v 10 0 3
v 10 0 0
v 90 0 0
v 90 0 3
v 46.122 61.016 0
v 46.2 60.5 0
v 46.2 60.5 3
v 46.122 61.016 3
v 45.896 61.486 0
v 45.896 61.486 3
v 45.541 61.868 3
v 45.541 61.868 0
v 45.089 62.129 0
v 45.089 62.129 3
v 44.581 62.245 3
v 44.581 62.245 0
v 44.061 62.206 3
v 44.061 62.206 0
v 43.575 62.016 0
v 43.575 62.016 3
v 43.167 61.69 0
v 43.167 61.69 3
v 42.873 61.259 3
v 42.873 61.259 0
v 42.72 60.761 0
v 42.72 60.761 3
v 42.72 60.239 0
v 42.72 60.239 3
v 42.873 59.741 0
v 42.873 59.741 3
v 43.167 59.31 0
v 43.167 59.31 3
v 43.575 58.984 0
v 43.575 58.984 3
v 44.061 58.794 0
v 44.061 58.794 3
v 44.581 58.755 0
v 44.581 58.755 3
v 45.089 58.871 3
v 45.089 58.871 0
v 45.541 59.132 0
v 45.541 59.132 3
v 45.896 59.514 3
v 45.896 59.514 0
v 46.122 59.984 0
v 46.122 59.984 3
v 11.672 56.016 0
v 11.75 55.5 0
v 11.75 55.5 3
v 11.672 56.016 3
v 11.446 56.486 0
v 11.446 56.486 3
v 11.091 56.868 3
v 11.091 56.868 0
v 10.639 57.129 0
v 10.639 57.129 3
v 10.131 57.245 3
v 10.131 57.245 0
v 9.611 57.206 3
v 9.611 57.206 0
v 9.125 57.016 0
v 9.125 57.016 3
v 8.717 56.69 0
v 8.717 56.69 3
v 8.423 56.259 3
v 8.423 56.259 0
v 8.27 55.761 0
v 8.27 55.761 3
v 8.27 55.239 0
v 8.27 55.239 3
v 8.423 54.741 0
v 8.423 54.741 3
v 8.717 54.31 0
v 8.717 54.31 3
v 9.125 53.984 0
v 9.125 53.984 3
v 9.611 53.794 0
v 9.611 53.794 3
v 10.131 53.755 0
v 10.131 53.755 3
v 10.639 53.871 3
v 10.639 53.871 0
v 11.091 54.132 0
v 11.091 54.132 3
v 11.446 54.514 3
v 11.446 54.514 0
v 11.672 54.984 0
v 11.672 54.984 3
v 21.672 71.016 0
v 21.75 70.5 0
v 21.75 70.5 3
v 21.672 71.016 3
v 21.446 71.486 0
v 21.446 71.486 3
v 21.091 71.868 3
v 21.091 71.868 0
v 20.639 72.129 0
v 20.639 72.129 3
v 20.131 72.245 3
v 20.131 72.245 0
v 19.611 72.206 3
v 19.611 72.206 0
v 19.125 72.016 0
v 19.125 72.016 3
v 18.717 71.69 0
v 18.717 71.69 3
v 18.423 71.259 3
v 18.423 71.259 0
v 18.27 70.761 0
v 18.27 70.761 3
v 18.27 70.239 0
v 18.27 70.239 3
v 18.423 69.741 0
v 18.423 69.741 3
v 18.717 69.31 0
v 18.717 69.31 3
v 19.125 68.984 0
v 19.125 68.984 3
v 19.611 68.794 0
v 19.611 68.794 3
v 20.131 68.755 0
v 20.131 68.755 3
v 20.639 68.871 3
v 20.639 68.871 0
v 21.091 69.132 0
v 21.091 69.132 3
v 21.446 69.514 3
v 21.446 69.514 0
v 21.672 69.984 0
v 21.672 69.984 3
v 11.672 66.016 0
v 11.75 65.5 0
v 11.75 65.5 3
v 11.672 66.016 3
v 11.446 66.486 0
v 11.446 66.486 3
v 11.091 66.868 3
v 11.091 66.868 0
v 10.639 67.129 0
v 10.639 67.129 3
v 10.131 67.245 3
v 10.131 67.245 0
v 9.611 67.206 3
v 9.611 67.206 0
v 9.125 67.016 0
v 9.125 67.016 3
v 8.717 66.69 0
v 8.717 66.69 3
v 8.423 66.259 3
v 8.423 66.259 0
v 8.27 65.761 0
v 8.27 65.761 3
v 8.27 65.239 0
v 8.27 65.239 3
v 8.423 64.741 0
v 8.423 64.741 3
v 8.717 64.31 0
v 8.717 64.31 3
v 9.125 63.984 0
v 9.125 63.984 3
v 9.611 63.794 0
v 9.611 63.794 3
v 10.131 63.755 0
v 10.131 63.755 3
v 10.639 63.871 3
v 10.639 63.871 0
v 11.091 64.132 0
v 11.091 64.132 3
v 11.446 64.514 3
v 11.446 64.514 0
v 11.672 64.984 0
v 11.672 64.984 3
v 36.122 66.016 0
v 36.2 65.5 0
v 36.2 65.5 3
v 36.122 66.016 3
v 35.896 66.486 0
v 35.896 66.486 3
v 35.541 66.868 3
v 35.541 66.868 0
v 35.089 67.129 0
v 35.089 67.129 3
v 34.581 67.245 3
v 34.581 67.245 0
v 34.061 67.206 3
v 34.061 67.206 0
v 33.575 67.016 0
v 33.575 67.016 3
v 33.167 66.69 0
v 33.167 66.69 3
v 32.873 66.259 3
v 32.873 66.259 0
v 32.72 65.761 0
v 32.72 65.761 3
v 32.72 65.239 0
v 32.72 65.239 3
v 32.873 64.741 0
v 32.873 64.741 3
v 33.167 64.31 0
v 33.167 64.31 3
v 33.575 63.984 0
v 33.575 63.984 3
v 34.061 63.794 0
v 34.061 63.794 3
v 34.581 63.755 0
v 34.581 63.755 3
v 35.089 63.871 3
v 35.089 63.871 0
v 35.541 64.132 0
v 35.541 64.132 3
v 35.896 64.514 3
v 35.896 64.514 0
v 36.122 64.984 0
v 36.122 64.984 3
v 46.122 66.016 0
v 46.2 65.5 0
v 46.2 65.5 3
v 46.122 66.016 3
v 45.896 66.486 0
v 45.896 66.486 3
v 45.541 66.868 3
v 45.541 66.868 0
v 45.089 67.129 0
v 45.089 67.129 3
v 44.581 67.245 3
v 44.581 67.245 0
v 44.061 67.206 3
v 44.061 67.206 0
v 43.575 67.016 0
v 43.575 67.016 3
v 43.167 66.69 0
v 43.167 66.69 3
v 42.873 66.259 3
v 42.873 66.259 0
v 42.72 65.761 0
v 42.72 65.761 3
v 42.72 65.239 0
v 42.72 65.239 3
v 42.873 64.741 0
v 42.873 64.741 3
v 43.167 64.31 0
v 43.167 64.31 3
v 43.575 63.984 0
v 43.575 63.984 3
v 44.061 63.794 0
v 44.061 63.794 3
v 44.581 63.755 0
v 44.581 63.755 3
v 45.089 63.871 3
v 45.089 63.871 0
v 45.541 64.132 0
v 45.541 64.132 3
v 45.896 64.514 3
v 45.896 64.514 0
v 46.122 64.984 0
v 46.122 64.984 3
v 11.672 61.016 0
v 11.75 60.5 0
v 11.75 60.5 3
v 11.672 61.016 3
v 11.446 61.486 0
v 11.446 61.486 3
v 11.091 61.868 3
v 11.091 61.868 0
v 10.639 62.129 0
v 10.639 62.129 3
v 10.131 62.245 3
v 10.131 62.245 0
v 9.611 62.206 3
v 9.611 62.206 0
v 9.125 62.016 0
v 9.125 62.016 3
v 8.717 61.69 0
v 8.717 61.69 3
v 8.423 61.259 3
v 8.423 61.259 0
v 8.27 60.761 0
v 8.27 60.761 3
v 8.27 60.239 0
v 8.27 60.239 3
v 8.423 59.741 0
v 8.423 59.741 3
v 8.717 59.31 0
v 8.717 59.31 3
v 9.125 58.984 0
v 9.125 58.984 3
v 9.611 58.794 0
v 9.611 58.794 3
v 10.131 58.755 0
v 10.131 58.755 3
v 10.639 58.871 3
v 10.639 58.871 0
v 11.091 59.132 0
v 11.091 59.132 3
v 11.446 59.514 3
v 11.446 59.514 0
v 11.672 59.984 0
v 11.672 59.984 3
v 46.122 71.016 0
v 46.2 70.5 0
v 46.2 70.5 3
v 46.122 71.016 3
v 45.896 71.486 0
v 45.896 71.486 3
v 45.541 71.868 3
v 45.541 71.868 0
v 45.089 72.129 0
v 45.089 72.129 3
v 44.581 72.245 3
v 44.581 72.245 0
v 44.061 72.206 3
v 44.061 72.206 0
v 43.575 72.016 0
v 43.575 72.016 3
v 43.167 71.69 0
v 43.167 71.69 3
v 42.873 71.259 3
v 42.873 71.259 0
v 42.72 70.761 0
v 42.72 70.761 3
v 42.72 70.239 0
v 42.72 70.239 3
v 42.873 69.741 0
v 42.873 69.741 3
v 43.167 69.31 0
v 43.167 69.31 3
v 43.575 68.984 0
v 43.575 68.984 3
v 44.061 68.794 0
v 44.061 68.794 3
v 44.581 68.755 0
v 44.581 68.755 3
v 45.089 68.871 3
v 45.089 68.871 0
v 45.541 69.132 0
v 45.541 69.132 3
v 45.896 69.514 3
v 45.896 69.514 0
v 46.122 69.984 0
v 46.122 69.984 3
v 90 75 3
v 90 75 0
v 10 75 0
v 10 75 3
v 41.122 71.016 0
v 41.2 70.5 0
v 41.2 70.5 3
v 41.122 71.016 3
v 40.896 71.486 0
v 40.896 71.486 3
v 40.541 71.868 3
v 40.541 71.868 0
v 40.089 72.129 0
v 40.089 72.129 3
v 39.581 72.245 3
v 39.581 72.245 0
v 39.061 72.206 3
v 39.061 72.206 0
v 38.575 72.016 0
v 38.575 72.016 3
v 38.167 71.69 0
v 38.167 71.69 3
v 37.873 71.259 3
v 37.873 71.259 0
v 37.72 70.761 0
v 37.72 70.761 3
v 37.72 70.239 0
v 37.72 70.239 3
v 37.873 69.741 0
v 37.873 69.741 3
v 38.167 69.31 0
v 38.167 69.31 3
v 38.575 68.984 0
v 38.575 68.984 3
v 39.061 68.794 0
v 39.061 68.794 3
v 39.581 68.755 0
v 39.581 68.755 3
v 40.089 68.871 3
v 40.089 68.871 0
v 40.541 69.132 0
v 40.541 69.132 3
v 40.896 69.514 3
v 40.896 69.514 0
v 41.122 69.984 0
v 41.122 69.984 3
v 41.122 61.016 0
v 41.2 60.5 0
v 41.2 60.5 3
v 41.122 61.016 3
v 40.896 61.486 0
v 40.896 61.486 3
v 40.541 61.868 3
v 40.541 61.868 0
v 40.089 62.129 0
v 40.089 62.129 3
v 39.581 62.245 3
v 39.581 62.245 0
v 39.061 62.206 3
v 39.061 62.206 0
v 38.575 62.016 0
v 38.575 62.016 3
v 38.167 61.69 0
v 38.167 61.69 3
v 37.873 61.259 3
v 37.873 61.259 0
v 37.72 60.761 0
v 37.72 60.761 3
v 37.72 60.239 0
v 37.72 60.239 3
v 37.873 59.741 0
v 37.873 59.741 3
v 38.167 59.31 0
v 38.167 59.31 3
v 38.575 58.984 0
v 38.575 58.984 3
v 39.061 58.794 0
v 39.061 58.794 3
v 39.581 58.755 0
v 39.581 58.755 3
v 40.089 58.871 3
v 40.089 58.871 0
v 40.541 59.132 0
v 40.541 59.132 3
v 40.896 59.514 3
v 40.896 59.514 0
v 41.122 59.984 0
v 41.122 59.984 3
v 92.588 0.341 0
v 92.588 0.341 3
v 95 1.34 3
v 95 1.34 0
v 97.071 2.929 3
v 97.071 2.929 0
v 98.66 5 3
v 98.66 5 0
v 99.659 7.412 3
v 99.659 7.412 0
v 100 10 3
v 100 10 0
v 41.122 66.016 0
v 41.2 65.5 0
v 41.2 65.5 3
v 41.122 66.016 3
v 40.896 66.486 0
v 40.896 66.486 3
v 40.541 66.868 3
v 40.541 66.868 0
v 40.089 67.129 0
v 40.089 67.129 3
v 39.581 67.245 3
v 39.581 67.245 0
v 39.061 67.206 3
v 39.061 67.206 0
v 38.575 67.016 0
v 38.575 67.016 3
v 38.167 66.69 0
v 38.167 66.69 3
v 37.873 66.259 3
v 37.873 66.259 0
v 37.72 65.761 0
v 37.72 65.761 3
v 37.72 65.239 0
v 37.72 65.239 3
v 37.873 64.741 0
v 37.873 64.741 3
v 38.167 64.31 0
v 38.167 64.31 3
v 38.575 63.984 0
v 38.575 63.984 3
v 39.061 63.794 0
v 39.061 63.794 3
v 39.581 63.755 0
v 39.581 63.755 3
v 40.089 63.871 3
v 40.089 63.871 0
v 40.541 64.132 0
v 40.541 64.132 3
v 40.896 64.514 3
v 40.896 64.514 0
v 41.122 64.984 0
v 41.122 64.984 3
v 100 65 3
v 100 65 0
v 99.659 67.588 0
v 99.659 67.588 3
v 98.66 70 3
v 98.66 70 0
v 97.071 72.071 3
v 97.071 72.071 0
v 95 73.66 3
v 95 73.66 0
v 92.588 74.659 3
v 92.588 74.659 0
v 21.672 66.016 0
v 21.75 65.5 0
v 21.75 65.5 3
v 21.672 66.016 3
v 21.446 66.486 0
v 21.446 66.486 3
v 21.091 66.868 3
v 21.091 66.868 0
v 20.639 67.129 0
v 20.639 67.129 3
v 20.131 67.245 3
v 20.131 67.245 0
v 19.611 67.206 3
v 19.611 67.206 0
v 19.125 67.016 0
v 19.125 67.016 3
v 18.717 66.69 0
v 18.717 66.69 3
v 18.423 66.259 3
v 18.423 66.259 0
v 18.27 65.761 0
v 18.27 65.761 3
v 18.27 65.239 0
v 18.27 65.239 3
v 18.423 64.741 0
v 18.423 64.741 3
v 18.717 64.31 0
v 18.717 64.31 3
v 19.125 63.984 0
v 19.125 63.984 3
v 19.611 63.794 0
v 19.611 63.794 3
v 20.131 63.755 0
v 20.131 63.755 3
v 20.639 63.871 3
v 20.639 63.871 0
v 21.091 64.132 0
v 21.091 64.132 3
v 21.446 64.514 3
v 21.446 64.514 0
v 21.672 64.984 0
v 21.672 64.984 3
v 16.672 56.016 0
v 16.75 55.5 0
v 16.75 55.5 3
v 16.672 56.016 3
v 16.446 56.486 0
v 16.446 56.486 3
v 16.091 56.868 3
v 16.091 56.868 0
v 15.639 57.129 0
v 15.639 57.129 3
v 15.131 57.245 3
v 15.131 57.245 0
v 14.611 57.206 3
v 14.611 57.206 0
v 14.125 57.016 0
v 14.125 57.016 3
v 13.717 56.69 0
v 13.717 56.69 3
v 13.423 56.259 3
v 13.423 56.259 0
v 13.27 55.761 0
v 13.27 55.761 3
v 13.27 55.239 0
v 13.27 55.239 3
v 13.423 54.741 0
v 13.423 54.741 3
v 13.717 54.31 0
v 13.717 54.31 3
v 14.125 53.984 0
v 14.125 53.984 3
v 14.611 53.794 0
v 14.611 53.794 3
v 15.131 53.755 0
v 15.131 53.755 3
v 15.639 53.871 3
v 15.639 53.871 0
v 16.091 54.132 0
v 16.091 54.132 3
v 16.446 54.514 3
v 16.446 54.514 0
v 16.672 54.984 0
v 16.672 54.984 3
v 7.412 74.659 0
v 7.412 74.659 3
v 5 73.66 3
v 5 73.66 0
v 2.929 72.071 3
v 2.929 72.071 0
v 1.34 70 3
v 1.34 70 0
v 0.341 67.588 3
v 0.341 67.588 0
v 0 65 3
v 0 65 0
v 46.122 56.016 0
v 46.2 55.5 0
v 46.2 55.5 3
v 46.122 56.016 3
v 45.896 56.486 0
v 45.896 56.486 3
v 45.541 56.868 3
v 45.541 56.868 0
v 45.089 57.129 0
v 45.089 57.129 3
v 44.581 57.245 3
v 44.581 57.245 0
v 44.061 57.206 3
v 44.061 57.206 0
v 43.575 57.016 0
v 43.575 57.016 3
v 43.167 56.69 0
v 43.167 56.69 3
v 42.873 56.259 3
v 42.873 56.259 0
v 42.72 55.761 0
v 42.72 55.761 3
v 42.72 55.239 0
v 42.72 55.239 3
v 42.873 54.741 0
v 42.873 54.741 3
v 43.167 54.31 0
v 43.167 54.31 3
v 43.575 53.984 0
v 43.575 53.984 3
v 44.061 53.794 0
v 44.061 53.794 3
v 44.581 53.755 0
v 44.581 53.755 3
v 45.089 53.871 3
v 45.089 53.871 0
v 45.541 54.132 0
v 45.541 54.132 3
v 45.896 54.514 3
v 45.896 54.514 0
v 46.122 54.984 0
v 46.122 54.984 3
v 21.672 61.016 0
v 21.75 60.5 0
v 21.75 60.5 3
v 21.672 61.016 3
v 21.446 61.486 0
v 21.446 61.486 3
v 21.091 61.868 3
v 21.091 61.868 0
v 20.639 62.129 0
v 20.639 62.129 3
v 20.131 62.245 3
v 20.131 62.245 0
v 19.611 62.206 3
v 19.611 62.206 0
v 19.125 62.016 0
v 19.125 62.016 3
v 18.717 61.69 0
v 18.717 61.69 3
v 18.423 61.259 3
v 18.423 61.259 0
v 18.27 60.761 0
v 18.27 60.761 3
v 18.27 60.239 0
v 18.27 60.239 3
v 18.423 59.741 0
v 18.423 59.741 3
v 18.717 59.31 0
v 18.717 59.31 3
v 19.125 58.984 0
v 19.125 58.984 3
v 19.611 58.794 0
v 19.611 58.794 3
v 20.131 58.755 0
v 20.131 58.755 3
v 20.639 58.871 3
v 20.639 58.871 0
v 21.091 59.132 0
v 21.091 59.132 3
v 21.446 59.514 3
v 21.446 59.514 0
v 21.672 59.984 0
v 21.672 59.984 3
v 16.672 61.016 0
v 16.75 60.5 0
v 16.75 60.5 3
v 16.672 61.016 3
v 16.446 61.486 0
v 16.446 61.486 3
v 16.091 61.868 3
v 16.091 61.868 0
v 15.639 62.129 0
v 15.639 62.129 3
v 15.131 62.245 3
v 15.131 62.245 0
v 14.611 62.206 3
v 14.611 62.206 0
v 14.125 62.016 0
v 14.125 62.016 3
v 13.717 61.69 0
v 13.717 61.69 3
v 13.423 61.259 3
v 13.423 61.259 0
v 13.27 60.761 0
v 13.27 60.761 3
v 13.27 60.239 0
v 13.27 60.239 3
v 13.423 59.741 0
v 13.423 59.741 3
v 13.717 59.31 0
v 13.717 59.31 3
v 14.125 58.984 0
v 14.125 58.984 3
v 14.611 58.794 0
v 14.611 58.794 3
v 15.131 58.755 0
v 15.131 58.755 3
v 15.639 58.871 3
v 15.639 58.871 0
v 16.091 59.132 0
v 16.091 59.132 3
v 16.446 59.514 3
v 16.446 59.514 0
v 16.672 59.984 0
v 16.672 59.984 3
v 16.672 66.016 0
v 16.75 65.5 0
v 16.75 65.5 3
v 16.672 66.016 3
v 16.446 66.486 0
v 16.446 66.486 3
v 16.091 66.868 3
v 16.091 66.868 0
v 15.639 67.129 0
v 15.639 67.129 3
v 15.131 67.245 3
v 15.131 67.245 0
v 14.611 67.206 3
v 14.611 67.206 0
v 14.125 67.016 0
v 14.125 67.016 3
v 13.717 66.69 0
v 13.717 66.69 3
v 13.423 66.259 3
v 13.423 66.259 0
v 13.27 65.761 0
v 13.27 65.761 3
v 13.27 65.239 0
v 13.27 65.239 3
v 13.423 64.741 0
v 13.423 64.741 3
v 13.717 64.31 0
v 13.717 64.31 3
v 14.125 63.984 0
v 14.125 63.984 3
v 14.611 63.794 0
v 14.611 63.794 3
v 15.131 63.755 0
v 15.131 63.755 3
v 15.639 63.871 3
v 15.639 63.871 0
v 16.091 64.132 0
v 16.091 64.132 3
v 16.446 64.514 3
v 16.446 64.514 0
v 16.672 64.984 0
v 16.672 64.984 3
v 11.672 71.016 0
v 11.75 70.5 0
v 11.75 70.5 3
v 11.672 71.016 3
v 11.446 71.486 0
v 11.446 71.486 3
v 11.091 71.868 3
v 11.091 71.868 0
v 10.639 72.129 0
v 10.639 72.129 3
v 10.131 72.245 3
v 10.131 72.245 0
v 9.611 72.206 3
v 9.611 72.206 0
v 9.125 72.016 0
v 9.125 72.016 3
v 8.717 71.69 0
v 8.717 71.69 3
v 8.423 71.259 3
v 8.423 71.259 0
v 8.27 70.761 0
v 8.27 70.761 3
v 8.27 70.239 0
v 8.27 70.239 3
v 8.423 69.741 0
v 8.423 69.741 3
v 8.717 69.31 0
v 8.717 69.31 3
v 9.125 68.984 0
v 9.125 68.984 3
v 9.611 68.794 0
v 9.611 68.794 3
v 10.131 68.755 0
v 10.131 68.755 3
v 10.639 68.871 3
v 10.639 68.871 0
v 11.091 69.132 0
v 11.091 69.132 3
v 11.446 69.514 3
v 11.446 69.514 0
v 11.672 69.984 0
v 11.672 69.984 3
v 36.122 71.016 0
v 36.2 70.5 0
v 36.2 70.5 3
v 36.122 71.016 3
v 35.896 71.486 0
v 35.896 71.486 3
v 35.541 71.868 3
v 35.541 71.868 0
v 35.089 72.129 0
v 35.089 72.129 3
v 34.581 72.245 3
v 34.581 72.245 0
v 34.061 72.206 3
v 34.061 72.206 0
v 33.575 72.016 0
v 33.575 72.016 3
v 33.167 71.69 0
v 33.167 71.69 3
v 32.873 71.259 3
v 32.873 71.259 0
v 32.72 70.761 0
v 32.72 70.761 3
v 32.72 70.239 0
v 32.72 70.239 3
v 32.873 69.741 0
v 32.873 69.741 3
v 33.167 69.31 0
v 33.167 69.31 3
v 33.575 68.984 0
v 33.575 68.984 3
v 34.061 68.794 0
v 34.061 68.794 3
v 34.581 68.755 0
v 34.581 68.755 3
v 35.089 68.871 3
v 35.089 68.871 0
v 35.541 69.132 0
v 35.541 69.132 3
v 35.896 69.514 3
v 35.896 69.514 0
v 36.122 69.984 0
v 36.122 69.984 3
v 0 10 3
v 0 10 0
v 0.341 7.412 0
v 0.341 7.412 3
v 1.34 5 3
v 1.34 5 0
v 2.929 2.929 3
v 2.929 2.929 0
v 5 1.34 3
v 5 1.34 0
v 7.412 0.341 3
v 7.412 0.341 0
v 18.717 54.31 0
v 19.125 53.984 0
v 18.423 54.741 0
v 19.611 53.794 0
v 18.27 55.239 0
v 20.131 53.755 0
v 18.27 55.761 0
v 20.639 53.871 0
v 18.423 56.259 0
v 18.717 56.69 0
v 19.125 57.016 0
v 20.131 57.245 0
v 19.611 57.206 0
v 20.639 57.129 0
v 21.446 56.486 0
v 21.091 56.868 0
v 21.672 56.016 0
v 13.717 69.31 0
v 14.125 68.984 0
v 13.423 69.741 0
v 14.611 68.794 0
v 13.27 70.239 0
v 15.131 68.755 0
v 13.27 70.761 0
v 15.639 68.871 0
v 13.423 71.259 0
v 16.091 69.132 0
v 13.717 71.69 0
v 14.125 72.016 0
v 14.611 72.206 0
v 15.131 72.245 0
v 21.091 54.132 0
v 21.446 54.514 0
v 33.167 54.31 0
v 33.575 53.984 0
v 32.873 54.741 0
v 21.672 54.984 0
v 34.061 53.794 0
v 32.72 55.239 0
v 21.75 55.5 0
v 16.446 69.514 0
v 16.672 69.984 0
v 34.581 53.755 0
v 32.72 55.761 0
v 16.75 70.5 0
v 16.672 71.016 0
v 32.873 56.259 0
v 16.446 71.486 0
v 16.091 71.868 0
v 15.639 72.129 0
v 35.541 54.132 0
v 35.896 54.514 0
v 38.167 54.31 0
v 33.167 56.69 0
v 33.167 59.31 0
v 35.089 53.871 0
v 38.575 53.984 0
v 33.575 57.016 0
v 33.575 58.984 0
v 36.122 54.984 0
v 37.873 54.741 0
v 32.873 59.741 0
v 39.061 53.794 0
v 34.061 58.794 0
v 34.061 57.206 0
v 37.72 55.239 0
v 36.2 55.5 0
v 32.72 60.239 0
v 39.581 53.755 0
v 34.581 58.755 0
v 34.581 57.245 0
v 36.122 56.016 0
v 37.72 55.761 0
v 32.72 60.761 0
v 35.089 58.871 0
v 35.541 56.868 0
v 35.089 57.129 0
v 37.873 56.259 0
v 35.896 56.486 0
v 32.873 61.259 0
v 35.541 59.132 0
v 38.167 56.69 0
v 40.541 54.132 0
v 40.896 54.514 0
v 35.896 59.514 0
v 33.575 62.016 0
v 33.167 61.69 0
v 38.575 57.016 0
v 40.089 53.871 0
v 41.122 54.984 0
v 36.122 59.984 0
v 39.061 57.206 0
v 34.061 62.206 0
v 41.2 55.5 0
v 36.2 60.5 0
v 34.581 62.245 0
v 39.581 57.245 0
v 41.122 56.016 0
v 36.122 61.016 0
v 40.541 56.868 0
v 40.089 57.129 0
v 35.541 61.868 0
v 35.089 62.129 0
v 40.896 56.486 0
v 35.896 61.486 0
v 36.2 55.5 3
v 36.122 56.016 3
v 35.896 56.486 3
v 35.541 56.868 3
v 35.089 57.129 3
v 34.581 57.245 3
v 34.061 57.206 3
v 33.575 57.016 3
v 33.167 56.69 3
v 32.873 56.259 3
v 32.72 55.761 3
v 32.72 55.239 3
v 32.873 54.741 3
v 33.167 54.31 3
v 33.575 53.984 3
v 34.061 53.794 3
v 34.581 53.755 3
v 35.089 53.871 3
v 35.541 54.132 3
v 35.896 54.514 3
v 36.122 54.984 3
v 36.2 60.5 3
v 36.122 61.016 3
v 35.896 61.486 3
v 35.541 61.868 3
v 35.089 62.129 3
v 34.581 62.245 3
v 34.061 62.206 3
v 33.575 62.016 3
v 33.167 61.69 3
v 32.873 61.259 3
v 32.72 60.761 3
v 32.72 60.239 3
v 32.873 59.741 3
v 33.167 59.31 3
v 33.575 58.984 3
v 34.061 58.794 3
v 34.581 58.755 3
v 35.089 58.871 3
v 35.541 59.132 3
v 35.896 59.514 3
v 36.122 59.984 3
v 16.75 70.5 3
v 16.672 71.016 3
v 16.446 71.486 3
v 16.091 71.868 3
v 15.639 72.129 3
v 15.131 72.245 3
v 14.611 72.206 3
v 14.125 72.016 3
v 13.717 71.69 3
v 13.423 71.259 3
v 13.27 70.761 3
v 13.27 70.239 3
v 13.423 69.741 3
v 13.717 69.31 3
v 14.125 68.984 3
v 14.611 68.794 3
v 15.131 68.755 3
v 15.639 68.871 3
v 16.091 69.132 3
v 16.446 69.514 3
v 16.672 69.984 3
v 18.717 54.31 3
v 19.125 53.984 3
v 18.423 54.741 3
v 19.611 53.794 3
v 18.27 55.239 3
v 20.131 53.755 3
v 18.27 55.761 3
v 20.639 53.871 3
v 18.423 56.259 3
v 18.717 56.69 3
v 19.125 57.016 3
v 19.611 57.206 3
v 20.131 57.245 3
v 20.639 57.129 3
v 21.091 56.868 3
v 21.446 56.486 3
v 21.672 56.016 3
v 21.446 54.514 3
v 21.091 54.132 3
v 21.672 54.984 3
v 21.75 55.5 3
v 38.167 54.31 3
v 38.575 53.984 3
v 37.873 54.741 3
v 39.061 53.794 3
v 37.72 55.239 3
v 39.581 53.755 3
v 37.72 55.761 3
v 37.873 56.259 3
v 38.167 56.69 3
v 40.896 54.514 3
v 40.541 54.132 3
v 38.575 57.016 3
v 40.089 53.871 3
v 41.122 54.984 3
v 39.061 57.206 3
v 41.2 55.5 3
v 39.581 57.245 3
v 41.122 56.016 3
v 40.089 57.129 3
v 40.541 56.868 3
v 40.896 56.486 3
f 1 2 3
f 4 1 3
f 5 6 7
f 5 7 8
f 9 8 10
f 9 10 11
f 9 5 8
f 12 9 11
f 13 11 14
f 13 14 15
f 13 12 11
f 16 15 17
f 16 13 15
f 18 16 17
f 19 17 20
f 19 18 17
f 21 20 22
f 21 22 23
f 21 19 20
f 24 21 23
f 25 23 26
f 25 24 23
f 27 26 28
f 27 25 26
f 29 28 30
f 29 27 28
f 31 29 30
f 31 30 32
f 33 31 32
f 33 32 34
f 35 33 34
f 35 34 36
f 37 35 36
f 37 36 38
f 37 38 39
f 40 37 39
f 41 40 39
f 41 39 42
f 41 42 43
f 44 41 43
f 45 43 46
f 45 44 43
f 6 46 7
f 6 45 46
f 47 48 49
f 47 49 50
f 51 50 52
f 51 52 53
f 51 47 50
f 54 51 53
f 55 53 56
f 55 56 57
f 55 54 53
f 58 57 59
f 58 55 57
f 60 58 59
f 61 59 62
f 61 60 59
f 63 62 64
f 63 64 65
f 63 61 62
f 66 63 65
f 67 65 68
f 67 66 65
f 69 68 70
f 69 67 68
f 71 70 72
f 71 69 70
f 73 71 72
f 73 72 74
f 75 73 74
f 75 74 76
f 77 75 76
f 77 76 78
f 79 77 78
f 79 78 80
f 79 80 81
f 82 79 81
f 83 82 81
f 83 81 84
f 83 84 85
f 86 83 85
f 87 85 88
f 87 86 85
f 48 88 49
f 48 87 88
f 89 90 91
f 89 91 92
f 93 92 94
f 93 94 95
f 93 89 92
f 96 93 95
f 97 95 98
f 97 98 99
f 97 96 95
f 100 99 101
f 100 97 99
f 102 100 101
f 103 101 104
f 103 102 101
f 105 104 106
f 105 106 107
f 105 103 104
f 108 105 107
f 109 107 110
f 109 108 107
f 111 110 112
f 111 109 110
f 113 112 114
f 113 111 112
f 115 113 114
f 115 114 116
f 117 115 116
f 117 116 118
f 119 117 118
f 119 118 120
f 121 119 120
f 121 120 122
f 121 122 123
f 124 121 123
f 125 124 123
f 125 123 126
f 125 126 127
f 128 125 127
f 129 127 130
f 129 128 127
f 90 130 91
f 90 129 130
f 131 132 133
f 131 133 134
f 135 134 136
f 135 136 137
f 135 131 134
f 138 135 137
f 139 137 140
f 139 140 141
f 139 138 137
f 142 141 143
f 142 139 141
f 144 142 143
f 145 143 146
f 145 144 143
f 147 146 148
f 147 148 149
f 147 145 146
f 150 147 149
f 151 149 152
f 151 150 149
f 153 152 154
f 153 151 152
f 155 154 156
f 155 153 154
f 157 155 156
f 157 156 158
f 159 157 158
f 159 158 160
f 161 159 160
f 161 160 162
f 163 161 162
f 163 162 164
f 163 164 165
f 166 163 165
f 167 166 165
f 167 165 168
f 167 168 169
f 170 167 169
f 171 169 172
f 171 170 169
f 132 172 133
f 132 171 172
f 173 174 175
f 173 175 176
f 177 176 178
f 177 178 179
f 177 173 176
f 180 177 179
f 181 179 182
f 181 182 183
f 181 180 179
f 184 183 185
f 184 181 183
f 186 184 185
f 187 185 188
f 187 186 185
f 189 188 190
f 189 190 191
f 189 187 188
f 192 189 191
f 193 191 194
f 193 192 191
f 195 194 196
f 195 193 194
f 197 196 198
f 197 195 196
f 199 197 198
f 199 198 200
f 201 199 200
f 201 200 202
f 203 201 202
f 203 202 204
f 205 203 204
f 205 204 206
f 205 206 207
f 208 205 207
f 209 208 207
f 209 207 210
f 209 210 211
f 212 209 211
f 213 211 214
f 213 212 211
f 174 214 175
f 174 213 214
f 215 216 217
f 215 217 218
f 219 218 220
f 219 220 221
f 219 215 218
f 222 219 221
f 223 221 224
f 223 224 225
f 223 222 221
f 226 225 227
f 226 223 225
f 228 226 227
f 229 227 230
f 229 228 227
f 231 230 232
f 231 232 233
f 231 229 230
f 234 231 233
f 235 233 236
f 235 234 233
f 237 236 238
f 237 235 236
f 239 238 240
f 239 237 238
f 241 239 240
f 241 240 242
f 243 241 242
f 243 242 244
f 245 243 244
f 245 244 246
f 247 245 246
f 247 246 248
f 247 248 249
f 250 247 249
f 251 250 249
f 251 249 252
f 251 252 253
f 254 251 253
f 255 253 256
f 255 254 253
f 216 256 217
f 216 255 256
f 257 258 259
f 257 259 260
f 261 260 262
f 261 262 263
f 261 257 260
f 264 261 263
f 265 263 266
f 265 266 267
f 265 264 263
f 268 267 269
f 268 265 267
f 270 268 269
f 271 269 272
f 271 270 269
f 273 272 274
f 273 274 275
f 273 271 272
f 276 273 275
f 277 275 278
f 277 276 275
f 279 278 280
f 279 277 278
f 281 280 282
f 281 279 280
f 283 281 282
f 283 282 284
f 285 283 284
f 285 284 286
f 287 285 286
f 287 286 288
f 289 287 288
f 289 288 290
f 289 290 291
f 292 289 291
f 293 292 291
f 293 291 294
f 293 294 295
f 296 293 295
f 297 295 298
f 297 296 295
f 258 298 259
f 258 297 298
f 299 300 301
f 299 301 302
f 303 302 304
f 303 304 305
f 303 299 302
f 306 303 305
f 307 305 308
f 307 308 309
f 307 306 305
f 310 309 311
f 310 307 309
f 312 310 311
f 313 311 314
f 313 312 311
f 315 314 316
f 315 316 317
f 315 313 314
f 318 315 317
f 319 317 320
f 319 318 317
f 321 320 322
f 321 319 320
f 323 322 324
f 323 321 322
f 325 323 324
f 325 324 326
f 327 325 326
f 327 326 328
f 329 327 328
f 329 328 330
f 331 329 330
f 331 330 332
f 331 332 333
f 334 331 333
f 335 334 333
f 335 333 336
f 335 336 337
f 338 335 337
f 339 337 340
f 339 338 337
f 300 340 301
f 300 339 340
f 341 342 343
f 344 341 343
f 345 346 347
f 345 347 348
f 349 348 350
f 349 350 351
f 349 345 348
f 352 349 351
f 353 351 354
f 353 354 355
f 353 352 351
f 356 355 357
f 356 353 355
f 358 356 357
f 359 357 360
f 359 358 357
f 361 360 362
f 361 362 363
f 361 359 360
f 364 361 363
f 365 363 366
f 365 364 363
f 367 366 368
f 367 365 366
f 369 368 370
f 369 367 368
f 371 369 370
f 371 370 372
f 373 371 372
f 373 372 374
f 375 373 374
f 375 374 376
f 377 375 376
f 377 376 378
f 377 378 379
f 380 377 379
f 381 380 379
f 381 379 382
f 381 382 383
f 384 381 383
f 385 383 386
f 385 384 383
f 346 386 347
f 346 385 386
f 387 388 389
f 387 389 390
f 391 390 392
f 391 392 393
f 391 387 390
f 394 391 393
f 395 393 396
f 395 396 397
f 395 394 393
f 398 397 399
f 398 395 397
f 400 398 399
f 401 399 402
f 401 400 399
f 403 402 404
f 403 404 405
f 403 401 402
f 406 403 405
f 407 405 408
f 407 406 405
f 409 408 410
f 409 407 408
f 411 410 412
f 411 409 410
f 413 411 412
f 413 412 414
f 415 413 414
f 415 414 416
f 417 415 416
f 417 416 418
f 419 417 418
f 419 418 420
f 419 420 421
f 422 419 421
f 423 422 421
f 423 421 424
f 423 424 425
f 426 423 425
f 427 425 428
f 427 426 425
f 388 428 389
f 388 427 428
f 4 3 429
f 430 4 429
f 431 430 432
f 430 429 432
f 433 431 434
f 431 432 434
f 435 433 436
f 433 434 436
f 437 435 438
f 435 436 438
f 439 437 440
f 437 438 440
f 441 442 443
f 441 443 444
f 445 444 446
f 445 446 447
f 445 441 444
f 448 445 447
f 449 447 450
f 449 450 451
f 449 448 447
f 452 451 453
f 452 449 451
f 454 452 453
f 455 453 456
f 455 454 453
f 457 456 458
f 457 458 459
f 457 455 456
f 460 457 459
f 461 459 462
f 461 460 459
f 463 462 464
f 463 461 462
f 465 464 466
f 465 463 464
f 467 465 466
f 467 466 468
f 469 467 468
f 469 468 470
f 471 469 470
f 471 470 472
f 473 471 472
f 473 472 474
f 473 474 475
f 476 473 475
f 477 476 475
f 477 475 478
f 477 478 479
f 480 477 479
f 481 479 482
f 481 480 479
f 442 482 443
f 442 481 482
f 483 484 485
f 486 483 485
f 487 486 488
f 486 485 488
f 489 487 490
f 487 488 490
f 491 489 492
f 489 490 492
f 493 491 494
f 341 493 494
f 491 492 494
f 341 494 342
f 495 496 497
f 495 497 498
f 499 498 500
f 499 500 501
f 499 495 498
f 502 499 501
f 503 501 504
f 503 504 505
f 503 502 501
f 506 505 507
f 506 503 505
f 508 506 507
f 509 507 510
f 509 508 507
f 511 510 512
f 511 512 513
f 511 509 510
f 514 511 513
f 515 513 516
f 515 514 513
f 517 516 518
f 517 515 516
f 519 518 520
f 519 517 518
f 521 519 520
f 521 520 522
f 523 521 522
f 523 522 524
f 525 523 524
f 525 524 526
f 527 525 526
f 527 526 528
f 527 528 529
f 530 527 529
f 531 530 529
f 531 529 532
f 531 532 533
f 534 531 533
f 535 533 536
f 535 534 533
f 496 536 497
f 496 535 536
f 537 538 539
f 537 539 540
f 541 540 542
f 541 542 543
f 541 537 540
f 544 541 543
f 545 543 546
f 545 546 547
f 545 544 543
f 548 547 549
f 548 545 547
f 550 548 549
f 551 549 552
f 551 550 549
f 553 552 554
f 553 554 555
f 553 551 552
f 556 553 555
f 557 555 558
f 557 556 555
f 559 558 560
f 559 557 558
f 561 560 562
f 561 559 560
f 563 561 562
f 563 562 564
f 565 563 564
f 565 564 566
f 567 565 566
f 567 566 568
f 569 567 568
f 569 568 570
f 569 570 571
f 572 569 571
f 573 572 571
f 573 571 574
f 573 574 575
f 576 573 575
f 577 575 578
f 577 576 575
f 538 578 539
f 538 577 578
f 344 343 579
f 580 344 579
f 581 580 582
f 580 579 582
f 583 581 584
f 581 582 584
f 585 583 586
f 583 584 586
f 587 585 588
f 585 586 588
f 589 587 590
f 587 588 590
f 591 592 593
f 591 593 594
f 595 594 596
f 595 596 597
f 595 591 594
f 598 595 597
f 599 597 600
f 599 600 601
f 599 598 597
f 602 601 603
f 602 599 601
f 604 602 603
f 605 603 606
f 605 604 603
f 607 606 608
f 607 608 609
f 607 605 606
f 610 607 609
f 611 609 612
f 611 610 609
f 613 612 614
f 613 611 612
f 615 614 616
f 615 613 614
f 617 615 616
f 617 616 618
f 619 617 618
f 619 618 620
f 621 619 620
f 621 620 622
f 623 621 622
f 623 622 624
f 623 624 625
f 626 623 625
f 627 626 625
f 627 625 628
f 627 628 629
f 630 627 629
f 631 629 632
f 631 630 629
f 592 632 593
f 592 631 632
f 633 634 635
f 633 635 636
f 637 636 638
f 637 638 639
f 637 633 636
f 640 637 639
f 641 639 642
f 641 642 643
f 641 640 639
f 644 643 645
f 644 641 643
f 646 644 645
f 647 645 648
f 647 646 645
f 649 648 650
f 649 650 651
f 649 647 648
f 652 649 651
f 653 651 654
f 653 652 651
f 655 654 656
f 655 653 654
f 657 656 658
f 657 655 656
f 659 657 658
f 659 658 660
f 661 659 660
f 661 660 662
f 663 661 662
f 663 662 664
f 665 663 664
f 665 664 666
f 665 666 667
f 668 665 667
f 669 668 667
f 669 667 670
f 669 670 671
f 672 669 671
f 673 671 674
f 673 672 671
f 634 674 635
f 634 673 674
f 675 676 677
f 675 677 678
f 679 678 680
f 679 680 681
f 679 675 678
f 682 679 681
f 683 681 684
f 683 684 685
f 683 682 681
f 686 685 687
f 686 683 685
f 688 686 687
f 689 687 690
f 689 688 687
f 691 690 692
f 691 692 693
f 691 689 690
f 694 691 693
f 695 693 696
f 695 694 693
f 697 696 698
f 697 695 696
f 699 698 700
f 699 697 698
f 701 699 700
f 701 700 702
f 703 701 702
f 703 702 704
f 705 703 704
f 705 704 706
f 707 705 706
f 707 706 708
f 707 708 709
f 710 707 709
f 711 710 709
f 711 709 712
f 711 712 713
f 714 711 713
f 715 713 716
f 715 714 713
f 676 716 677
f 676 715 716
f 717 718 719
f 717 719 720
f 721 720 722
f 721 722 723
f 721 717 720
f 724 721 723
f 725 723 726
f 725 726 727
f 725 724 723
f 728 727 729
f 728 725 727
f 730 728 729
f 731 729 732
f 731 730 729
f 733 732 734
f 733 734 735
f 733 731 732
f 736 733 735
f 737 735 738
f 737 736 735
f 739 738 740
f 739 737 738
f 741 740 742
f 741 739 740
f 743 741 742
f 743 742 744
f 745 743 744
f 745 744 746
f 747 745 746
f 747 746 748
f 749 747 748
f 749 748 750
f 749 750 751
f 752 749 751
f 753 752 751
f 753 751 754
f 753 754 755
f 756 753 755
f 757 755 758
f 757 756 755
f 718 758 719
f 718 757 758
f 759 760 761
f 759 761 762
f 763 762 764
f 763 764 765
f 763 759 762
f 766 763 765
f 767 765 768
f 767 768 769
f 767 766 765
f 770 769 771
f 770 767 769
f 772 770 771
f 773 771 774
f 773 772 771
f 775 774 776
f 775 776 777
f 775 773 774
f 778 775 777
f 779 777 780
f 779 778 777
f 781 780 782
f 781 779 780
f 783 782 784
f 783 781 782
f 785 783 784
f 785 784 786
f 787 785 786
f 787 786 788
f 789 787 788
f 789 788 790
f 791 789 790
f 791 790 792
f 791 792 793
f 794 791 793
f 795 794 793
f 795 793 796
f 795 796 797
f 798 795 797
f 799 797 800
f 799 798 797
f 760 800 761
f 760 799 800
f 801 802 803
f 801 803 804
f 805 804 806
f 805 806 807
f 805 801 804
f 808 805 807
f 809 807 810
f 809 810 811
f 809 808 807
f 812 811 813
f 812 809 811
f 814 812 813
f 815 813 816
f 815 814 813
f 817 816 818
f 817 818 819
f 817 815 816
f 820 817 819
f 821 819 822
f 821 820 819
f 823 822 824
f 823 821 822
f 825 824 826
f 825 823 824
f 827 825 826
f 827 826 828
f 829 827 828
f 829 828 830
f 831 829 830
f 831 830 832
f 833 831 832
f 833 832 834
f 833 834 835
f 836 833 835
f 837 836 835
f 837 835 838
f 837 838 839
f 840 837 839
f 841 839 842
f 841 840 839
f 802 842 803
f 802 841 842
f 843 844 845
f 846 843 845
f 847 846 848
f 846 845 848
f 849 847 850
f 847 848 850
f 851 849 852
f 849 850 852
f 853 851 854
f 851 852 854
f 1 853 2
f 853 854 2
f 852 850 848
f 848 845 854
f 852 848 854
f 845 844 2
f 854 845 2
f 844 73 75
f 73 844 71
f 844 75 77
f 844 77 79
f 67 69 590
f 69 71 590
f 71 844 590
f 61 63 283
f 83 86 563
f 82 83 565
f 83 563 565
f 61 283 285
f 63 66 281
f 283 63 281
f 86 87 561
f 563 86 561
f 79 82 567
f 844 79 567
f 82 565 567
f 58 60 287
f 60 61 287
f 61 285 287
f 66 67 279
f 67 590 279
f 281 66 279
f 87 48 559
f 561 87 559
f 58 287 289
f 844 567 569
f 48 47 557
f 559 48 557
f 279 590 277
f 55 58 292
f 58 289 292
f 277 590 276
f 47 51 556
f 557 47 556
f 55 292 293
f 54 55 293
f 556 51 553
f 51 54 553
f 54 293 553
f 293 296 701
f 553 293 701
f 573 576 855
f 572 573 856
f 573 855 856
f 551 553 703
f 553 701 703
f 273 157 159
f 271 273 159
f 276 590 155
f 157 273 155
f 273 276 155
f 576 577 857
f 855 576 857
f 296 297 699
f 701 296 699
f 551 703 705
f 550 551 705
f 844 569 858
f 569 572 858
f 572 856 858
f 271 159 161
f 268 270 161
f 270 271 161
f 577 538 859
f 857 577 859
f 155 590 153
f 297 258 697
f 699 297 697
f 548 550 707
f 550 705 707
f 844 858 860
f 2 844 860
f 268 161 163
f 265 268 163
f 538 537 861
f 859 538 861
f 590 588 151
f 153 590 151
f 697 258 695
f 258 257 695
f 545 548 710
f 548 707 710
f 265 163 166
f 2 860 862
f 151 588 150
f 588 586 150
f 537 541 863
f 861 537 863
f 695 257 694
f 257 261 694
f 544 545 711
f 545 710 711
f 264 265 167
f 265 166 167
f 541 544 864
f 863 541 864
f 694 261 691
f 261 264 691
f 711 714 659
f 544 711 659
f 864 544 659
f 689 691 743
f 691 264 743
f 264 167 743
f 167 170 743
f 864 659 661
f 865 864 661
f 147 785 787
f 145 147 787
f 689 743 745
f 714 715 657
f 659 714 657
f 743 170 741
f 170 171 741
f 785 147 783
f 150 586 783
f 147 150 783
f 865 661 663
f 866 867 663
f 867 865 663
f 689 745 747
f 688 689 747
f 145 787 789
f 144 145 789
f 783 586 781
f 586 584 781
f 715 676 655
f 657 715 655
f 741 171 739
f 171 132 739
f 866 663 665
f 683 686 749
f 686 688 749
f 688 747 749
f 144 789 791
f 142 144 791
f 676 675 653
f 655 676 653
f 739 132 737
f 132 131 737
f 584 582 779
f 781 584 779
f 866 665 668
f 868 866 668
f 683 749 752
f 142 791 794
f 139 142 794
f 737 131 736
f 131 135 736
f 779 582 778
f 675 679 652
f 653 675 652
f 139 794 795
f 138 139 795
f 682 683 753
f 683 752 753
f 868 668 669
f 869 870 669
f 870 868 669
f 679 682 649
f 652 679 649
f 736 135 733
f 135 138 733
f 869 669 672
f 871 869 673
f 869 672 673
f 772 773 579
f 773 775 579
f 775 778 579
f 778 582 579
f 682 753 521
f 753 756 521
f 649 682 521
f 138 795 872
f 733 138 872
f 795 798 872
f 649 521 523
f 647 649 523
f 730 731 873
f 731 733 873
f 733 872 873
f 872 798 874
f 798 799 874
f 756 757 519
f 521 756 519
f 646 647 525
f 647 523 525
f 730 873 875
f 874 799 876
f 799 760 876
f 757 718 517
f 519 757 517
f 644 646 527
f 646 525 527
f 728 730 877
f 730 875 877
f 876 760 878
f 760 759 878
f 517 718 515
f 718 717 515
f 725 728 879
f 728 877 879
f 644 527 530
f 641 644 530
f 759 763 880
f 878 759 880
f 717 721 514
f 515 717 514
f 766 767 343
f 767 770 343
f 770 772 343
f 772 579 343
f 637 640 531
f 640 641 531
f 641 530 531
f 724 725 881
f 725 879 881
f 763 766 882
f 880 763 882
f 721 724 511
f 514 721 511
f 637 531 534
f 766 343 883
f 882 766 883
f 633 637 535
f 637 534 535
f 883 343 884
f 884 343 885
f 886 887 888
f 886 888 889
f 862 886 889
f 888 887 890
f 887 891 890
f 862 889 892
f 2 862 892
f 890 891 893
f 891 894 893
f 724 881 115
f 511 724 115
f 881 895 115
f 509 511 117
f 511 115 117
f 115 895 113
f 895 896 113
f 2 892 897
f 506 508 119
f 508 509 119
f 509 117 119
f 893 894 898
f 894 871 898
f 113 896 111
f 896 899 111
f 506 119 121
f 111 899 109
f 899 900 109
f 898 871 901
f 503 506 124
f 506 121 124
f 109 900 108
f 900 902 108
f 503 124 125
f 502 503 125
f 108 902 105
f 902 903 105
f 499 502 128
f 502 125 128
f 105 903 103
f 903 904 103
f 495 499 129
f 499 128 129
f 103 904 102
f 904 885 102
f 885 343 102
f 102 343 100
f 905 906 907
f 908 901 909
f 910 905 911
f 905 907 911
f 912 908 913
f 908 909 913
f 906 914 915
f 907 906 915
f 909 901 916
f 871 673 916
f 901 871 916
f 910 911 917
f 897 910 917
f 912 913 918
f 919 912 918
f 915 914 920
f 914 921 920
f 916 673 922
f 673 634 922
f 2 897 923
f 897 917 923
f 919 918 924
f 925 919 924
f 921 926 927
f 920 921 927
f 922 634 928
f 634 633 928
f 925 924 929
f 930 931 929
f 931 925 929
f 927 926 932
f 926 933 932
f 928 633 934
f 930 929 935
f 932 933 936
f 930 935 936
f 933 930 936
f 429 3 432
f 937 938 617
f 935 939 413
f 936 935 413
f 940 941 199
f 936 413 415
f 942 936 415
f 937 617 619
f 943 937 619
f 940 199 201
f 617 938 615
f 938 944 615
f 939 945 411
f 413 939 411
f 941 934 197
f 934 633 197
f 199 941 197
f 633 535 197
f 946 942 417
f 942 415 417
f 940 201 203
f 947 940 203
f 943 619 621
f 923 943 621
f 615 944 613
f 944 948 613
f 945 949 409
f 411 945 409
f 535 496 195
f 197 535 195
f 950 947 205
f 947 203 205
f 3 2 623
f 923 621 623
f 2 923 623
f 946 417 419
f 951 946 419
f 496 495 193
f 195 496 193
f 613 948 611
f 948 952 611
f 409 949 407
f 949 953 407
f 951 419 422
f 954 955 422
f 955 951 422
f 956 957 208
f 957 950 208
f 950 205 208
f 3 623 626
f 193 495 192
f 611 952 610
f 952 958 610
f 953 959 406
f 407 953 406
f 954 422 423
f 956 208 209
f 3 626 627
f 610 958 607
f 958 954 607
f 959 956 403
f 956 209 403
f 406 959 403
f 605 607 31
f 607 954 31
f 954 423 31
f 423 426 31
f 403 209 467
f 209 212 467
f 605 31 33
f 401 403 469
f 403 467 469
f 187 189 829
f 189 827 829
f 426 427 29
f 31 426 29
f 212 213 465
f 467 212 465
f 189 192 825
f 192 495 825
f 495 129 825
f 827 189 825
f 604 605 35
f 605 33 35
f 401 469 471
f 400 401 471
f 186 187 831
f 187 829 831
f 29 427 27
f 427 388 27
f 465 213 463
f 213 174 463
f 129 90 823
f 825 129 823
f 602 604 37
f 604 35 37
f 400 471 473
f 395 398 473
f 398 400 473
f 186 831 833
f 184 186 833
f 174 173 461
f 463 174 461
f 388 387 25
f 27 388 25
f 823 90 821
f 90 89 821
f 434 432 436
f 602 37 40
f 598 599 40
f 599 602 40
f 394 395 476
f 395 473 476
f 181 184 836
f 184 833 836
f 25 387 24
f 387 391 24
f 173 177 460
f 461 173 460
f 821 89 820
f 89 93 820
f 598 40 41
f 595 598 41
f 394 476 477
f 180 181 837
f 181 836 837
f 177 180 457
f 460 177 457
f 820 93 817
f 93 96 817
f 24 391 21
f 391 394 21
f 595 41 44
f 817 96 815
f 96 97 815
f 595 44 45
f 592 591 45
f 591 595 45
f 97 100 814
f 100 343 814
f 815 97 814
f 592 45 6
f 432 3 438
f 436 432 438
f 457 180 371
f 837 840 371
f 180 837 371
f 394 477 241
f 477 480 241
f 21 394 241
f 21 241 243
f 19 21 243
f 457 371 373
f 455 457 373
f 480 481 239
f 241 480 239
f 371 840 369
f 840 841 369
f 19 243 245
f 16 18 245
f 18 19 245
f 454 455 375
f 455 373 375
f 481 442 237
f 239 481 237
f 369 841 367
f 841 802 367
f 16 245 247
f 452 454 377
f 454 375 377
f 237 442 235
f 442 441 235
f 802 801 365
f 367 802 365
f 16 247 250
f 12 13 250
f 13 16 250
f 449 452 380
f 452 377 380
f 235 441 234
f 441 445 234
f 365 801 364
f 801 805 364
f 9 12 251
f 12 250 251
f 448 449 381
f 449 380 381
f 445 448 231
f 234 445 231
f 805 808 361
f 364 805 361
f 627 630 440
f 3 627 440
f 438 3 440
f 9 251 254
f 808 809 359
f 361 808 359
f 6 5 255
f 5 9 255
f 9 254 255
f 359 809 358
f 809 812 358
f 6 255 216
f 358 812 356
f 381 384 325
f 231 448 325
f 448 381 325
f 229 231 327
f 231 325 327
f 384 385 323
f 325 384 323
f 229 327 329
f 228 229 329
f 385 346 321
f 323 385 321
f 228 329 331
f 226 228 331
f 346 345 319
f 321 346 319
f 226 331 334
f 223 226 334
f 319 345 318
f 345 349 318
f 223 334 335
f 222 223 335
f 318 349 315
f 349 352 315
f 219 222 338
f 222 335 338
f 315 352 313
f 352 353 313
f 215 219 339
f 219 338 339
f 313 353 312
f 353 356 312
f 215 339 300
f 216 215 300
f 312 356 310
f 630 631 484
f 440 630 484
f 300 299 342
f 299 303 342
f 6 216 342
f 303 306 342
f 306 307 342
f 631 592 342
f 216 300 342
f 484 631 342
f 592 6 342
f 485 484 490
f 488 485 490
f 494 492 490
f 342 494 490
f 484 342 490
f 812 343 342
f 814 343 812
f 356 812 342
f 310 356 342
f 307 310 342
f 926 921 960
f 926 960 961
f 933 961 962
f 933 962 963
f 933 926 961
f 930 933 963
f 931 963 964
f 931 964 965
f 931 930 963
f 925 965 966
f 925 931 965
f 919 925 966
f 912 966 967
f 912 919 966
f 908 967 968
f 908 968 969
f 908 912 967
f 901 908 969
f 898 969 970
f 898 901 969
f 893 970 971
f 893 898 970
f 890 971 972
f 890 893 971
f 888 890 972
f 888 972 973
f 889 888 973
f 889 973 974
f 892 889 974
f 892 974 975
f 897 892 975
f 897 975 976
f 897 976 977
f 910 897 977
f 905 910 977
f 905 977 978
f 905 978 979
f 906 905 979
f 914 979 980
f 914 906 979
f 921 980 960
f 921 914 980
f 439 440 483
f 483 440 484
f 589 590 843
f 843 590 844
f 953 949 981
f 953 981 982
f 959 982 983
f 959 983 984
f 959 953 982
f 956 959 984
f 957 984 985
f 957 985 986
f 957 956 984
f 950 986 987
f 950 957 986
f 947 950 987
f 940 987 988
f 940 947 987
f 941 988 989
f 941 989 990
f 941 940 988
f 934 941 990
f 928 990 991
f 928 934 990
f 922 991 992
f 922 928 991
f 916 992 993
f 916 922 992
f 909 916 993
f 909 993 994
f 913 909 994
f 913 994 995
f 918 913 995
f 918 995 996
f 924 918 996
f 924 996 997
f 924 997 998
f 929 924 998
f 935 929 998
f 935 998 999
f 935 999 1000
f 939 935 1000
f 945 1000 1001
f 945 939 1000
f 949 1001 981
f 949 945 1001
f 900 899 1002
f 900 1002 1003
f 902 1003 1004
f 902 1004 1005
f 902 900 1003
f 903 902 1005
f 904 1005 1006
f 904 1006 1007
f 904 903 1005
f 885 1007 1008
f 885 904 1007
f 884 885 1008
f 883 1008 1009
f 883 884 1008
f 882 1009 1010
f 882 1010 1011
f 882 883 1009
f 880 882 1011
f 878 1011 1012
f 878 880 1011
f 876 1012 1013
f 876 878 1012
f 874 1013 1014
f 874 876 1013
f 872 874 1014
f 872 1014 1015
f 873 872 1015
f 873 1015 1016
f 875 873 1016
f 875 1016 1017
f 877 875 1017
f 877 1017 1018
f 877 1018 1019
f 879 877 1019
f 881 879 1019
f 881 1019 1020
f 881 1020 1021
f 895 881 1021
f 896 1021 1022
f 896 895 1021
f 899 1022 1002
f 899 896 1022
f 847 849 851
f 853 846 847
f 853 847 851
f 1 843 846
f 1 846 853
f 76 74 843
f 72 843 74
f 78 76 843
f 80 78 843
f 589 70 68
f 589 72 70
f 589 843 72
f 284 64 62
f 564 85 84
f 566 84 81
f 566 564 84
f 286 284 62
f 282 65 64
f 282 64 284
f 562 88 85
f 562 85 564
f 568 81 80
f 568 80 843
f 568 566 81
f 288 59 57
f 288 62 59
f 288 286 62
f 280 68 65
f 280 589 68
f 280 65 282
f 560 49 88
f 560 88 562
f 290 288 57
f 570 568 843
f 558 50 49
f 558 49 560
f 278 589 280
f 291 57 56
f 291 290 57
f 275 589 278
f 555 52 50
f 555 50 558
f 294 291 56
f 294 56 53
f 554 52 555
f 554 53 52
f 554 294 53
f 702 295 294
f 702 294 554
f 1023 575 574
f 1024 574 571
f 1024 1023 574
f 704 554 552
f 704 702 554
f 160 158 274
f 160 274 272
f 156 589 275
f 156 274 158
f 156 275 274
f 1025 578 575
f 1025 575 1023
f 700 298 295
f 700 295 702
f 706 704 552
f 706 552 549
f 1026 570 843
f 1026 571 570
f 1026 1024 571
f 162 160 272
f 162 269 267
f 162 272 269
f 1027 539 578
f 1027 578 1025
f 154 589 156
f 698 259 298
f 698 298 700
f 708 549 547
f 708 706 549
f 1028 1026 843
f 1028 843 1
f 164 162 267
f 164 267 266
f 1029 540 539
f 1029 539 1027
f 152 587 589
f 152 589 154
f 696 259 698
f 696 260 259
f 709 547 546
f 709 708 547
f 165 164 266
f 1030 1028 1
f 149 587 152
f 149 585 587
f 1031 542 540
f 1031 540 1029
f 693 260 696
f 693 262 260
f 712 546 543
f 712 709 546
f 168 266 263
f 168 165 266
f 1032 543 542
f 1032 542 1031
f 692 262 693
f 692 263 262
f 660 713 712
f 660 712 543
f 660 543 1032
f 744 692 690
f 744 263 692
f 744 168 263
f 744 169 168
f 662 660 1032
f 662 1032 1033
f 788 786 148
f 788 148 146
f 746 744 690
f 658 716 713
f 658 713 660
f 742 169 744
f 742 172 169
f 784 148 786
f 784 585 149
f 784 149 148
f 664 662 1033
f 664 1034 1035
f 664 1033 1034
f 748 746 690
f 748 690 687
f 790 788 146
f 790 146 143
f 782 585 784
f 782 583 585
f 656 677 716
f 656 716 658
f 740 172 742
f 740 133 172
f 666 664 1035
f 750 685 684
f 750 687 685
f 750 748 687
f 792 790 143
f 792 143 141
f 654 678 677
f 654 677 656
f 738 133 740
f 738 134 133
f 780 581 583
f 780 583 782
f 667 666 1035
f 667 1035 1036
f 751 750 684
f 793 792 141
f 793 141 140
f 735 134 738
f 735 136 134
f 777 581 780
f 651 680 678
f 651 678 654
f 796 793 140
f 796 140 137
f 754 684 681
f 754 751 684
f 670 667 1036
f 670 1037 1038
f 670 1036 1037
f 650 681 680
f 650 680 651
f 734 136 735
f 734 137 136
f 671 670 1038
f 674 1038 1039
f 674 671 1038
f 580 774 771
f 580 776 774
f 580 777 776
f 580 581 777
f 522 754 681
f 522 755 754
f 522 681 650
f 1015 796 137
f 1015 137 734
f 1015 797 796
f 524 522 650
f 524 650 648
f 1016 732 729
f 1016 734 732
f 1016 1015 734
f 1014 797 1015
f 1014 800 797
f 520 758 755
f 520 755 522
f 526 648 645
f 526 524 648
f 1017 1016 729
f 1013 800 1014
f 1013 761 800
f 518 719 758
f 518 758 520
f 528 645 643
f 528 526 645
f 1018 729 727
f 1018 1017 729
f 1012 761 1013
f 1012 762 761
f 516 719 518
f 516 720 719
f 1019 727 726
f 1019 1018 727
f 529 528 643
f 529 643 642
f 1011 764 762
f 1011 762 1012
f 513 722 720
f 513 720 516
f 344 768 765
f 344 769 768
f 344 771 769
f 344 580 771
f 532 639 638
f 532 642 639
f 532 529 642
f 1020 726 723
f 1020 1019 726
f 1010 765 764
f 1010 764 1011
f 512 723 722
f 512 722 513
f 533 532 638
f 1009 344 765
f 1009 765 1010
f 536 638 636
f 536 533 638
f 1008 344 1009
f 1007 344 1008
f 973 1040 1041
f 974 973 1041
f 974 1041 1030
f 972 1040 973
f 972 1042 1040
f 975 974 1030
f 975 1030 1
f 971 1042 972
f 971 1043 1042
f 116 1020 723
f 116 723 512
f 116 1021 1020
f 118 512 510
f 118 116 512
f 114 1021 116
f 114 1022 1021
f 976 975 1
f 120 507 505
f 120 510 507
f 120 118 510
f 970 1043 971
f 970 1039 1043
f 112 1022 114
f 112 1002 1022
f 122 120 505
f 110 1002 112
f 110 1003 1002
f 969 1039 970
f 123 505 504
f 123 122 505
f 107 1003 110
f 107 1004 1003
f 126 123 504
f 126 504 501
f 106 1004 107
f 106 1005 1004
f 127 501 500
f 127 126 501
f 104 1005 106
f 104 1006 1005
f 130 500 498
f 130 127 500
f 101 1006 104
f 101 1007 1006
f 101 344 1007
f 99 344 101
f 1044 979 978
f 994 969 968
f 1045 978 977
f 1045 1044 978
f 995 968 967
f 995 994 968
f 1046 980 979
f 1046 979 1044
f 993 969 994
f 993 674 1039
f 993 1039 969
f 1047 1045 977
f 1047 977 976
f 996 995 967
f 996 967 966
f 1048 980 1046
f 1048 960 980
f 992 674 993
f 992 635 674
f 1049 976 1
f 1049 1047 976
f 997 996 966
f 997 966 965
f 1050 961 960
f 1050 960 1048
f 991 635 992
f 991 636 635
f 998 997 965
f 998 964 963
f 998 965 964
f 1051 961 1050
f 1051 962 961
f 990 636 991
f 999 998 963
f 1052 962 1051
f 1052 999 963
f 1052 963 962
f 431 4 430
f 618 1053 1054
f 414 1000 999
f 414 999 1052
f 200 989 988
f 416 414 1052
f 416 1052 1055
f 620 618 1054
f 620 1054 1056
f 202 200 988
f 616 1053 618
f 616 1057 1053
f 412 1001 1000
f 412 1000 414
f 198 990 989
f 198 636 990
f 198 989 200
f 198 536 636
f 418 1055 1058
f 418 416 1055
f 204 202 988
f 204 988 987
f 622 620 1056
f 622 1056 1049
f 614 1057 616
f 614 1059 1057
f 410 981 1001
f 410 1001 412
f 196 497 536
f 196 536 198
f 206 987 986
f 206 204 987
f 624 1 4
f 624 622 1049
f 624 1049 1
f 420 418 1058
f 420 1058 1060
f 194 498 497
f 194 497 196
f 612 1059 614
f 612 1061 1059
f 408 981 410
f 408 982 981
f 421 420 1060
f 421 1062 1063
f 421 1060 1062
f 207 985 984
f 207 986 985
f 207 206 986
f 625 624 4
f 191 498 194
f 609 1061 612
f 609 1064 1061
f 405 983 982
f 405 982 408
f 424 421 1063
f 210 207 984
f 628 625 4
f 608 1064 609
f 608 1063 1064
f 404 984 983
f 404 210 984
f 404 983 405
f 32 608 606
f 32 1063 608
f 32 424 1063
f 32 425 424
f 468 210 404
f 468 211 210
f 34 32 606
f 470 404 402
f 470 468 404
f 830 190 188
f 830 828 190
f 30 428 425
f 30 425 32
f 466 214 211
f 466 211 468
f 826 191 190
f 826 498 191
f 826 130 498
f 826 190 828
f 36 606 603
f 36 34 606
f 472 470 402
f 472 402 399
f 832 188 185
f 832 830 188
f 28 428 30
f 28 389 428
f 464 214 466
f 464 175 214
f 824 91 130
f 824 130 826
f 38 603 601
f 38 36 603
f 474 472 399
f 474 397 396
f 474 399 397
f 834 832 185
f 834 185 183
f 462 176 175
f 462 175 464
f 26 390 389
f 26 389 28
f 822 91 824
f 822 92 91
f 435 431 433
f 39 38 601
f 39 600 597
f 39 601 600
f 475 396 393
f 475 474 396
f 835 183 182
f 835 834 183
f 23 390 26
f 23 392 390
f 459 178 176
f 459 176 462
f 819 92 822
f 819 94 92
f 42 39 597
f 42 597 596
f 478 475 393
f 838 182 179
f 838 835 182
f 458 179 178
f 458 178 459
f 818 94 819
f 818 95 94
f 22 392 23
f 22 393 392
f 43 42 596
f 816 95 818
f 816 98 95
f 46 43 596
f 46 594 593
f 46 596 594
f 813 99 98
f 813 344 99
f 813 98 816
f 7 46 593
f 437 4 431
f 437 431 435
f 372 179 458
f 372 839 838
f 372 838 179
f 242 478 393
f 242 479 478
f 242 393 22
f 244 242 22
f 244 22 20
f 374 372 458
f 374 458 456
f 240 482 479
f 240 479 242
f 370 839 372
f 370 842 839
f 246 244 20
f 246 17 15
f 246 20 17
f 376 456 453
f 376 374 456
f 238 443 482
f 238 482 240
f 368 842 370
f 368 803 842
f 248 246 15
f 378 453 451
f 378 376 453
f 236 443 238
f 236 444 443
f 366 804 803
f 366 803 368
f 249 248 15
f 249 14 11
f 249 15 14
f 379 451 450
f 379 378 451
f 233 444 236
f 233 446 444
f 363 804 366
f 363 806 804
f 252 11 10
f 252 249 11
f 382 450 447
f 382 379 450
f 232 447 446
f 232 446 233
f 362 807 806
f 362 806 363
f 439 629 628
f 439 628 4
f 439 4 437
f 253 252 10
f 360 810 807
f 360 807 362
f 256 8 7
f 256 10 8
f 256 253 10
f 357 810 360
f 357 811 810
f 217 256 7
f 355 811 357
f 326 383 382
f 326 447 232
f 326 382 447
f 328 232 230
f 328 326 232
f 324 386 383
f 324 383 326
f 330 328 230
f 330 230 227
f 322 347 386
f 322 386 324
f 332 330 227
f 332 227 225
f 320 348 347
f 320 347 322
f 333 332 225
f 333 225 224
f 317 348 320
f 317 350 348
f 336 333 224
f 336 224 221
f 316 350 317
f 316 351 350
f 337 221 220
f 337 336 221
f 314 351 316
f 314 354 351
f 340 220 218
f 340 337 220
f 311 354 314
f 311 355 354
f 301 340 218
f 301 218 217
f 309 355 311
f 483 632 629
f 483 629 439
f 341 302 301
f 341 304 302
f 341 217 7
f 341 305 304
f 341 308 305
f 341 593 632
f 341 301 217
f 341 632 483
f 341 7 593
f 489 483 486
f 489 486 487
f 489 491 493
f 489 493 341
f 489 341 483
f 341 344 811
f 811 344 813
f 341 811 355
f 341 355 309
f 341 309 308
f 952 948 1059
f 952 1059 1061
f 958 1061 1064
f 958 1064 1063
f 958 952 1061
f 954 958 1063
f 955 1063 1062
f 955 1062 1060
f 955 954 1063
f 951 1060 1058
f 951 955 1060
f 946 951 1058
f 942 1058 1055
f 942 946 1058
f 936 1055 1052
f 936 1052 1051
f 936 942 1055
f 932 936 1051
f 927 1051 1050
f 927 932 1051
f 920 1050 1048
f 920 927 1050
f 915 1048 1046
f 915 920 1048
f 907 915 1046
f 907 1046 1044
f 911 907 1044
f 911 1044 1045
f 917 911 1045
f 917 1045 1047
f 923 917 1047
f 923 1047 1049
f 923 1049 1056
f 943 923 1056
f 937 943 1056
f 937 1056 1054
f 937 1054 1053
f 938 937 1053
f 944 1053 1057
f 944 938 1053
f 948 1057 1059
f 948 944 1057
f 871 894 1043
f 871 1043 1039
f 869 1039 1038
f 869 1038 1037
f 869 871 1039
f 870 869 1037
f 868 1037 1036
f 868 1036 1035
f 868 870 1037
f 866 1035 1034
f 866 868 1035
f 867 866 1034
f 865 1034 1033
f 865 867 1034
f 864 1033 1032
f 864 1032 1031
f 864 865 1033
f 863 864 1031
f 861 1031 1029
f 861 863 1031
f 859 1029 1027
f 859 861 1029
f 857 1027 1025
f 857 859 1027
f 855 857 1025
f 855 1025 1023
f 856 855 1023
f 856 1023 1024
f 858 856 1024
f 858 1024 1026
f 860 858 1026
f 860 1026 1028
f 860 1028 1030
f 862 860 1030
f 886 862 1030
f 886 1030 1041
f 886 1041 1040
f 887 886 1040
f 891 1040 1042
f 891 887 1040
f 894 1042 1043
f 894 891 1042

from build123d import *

# Parameters (mm, degrees)
SKETCH1_R           = 1.75
BOSS_EXTRUDE1_DEPTH = 3


with BuildPart() as part:
    # Sketch1 → Boss-Extrude1 (new body)
    with BuildSketch(Plane.XY):
        with BuildLine():
            Line((10, 0), (90, 0))
            ThreePointArc((90, 0), (97.071067812, 2.928932188), (100, 10))
            Line((100, 10), (100, 65))
            ThreePointArc((100, 65), (97.071067812, 72.071067812), (90, 75))
            Line((90, 75), (10, 75))
            ThreePointArc((10, 75), (2.928932188, 72.071067812), (0, 65))
            Line((0, 65), (0, 10))
            ThreePointArc((0, 10), (2.928932188, 2.928932188), (10, 0))
        make_face()
        with Locations((10, 70.5)):
            Circle(SKETCH1_R, mode=Mode.SUBTRACT)
        with Locations((10, 65.5)):
            Circle(SKETCH1_R, mode=Mode.SUBTRACT)
        with Locations((10, 60.5)):
            Circle(SKETCH1_R, mode=Mode.SUBTRACT)
        with Locations((10, 55.5)):
            Circle(SKETCH1_R, mode=Mode.SUBTRACT)
        with Locations((15, 70.5)):
            Circle(SKETCH1_R, mode=Mode.SUBTRACT)
        with Locations((15, 65.5)):
            Circle(SKETCH1_R, mode=Mode.SUBTRACT)
        with Locations((15, 60.5)):
            Circle(SKETCH1_R, mode=Mode.SUBTRACT)
        with Locations((15, 55.5)):
            Circle(SKETCH1_R, mode=Mode.SUBTRACT)
        with Locations((20, 70.5)):
            Circle(SKETCH1_R, mode=Mode.SUBTRACT)
        with Locations((20, 65.5)):
            Circle(SKETCH1_R, mode=Mode.SUBTRACT)
        with Locations((20, 60.5)):
            Circle(SKETCH1_R, mode=Mode.SUBTRACT)
        with Locations((20, 55.5)):
            Circle(SKETCH1_R, mode=Mode.SUBTRACT)
        with Locations((34.45, 70.5)):
            Circle(SKETCH1_R, mode=Mode.SUBTRACT)
        with Locations((39.45, 70.5)):
            Circle(SKETCH1_R, mode=Mode.SUBTRACT)
        with Locations((44.45, 70.5)):
            Circle(SKETCH1_R, mode=Mode.SUBTRACT)
        with Locations((44.45, 65.5)):
            Circle(SKETCH1_R, mode=Mode.SUBTRACT)
        with Locations((39.45, 65.5)):
            Circle(SKETCH1_R, mode=Mode.SUBTRACT)
        with Locations((34.45, 65.5)):
            Circle(SKETCH1_R, mode=Mode.SUBTRACT)
        with Locations((34.45, 60.5)):
            Circle(SKETCH1_R, mode=Mode.SUBTRACT)
        with Locations((39.45, 60.5)):
            Circle(SKETCH1_R, mode=Mode.SUBTRACT)
        with Locations((44.45, 60.5)):
            Circle(SKETCH1_R, mode=Mode.SUBTRACT)
        with Locations((44.45, 55.5)):
            Circle(SKETCH1_R, mode=Mode.SUBTRACT)
        with Locations((39.45, 55.5)):
            Circle(SKETCH1_R, mode=Mode.SUBTRACT)
        with Locations((34.45, 55.5)):
            Circle(SKETCH1_R, mode=Mode.SUBTRACT)
    extrude(amount=BOSS_EXTRUDE1_DEPTH)


solid = part.part
